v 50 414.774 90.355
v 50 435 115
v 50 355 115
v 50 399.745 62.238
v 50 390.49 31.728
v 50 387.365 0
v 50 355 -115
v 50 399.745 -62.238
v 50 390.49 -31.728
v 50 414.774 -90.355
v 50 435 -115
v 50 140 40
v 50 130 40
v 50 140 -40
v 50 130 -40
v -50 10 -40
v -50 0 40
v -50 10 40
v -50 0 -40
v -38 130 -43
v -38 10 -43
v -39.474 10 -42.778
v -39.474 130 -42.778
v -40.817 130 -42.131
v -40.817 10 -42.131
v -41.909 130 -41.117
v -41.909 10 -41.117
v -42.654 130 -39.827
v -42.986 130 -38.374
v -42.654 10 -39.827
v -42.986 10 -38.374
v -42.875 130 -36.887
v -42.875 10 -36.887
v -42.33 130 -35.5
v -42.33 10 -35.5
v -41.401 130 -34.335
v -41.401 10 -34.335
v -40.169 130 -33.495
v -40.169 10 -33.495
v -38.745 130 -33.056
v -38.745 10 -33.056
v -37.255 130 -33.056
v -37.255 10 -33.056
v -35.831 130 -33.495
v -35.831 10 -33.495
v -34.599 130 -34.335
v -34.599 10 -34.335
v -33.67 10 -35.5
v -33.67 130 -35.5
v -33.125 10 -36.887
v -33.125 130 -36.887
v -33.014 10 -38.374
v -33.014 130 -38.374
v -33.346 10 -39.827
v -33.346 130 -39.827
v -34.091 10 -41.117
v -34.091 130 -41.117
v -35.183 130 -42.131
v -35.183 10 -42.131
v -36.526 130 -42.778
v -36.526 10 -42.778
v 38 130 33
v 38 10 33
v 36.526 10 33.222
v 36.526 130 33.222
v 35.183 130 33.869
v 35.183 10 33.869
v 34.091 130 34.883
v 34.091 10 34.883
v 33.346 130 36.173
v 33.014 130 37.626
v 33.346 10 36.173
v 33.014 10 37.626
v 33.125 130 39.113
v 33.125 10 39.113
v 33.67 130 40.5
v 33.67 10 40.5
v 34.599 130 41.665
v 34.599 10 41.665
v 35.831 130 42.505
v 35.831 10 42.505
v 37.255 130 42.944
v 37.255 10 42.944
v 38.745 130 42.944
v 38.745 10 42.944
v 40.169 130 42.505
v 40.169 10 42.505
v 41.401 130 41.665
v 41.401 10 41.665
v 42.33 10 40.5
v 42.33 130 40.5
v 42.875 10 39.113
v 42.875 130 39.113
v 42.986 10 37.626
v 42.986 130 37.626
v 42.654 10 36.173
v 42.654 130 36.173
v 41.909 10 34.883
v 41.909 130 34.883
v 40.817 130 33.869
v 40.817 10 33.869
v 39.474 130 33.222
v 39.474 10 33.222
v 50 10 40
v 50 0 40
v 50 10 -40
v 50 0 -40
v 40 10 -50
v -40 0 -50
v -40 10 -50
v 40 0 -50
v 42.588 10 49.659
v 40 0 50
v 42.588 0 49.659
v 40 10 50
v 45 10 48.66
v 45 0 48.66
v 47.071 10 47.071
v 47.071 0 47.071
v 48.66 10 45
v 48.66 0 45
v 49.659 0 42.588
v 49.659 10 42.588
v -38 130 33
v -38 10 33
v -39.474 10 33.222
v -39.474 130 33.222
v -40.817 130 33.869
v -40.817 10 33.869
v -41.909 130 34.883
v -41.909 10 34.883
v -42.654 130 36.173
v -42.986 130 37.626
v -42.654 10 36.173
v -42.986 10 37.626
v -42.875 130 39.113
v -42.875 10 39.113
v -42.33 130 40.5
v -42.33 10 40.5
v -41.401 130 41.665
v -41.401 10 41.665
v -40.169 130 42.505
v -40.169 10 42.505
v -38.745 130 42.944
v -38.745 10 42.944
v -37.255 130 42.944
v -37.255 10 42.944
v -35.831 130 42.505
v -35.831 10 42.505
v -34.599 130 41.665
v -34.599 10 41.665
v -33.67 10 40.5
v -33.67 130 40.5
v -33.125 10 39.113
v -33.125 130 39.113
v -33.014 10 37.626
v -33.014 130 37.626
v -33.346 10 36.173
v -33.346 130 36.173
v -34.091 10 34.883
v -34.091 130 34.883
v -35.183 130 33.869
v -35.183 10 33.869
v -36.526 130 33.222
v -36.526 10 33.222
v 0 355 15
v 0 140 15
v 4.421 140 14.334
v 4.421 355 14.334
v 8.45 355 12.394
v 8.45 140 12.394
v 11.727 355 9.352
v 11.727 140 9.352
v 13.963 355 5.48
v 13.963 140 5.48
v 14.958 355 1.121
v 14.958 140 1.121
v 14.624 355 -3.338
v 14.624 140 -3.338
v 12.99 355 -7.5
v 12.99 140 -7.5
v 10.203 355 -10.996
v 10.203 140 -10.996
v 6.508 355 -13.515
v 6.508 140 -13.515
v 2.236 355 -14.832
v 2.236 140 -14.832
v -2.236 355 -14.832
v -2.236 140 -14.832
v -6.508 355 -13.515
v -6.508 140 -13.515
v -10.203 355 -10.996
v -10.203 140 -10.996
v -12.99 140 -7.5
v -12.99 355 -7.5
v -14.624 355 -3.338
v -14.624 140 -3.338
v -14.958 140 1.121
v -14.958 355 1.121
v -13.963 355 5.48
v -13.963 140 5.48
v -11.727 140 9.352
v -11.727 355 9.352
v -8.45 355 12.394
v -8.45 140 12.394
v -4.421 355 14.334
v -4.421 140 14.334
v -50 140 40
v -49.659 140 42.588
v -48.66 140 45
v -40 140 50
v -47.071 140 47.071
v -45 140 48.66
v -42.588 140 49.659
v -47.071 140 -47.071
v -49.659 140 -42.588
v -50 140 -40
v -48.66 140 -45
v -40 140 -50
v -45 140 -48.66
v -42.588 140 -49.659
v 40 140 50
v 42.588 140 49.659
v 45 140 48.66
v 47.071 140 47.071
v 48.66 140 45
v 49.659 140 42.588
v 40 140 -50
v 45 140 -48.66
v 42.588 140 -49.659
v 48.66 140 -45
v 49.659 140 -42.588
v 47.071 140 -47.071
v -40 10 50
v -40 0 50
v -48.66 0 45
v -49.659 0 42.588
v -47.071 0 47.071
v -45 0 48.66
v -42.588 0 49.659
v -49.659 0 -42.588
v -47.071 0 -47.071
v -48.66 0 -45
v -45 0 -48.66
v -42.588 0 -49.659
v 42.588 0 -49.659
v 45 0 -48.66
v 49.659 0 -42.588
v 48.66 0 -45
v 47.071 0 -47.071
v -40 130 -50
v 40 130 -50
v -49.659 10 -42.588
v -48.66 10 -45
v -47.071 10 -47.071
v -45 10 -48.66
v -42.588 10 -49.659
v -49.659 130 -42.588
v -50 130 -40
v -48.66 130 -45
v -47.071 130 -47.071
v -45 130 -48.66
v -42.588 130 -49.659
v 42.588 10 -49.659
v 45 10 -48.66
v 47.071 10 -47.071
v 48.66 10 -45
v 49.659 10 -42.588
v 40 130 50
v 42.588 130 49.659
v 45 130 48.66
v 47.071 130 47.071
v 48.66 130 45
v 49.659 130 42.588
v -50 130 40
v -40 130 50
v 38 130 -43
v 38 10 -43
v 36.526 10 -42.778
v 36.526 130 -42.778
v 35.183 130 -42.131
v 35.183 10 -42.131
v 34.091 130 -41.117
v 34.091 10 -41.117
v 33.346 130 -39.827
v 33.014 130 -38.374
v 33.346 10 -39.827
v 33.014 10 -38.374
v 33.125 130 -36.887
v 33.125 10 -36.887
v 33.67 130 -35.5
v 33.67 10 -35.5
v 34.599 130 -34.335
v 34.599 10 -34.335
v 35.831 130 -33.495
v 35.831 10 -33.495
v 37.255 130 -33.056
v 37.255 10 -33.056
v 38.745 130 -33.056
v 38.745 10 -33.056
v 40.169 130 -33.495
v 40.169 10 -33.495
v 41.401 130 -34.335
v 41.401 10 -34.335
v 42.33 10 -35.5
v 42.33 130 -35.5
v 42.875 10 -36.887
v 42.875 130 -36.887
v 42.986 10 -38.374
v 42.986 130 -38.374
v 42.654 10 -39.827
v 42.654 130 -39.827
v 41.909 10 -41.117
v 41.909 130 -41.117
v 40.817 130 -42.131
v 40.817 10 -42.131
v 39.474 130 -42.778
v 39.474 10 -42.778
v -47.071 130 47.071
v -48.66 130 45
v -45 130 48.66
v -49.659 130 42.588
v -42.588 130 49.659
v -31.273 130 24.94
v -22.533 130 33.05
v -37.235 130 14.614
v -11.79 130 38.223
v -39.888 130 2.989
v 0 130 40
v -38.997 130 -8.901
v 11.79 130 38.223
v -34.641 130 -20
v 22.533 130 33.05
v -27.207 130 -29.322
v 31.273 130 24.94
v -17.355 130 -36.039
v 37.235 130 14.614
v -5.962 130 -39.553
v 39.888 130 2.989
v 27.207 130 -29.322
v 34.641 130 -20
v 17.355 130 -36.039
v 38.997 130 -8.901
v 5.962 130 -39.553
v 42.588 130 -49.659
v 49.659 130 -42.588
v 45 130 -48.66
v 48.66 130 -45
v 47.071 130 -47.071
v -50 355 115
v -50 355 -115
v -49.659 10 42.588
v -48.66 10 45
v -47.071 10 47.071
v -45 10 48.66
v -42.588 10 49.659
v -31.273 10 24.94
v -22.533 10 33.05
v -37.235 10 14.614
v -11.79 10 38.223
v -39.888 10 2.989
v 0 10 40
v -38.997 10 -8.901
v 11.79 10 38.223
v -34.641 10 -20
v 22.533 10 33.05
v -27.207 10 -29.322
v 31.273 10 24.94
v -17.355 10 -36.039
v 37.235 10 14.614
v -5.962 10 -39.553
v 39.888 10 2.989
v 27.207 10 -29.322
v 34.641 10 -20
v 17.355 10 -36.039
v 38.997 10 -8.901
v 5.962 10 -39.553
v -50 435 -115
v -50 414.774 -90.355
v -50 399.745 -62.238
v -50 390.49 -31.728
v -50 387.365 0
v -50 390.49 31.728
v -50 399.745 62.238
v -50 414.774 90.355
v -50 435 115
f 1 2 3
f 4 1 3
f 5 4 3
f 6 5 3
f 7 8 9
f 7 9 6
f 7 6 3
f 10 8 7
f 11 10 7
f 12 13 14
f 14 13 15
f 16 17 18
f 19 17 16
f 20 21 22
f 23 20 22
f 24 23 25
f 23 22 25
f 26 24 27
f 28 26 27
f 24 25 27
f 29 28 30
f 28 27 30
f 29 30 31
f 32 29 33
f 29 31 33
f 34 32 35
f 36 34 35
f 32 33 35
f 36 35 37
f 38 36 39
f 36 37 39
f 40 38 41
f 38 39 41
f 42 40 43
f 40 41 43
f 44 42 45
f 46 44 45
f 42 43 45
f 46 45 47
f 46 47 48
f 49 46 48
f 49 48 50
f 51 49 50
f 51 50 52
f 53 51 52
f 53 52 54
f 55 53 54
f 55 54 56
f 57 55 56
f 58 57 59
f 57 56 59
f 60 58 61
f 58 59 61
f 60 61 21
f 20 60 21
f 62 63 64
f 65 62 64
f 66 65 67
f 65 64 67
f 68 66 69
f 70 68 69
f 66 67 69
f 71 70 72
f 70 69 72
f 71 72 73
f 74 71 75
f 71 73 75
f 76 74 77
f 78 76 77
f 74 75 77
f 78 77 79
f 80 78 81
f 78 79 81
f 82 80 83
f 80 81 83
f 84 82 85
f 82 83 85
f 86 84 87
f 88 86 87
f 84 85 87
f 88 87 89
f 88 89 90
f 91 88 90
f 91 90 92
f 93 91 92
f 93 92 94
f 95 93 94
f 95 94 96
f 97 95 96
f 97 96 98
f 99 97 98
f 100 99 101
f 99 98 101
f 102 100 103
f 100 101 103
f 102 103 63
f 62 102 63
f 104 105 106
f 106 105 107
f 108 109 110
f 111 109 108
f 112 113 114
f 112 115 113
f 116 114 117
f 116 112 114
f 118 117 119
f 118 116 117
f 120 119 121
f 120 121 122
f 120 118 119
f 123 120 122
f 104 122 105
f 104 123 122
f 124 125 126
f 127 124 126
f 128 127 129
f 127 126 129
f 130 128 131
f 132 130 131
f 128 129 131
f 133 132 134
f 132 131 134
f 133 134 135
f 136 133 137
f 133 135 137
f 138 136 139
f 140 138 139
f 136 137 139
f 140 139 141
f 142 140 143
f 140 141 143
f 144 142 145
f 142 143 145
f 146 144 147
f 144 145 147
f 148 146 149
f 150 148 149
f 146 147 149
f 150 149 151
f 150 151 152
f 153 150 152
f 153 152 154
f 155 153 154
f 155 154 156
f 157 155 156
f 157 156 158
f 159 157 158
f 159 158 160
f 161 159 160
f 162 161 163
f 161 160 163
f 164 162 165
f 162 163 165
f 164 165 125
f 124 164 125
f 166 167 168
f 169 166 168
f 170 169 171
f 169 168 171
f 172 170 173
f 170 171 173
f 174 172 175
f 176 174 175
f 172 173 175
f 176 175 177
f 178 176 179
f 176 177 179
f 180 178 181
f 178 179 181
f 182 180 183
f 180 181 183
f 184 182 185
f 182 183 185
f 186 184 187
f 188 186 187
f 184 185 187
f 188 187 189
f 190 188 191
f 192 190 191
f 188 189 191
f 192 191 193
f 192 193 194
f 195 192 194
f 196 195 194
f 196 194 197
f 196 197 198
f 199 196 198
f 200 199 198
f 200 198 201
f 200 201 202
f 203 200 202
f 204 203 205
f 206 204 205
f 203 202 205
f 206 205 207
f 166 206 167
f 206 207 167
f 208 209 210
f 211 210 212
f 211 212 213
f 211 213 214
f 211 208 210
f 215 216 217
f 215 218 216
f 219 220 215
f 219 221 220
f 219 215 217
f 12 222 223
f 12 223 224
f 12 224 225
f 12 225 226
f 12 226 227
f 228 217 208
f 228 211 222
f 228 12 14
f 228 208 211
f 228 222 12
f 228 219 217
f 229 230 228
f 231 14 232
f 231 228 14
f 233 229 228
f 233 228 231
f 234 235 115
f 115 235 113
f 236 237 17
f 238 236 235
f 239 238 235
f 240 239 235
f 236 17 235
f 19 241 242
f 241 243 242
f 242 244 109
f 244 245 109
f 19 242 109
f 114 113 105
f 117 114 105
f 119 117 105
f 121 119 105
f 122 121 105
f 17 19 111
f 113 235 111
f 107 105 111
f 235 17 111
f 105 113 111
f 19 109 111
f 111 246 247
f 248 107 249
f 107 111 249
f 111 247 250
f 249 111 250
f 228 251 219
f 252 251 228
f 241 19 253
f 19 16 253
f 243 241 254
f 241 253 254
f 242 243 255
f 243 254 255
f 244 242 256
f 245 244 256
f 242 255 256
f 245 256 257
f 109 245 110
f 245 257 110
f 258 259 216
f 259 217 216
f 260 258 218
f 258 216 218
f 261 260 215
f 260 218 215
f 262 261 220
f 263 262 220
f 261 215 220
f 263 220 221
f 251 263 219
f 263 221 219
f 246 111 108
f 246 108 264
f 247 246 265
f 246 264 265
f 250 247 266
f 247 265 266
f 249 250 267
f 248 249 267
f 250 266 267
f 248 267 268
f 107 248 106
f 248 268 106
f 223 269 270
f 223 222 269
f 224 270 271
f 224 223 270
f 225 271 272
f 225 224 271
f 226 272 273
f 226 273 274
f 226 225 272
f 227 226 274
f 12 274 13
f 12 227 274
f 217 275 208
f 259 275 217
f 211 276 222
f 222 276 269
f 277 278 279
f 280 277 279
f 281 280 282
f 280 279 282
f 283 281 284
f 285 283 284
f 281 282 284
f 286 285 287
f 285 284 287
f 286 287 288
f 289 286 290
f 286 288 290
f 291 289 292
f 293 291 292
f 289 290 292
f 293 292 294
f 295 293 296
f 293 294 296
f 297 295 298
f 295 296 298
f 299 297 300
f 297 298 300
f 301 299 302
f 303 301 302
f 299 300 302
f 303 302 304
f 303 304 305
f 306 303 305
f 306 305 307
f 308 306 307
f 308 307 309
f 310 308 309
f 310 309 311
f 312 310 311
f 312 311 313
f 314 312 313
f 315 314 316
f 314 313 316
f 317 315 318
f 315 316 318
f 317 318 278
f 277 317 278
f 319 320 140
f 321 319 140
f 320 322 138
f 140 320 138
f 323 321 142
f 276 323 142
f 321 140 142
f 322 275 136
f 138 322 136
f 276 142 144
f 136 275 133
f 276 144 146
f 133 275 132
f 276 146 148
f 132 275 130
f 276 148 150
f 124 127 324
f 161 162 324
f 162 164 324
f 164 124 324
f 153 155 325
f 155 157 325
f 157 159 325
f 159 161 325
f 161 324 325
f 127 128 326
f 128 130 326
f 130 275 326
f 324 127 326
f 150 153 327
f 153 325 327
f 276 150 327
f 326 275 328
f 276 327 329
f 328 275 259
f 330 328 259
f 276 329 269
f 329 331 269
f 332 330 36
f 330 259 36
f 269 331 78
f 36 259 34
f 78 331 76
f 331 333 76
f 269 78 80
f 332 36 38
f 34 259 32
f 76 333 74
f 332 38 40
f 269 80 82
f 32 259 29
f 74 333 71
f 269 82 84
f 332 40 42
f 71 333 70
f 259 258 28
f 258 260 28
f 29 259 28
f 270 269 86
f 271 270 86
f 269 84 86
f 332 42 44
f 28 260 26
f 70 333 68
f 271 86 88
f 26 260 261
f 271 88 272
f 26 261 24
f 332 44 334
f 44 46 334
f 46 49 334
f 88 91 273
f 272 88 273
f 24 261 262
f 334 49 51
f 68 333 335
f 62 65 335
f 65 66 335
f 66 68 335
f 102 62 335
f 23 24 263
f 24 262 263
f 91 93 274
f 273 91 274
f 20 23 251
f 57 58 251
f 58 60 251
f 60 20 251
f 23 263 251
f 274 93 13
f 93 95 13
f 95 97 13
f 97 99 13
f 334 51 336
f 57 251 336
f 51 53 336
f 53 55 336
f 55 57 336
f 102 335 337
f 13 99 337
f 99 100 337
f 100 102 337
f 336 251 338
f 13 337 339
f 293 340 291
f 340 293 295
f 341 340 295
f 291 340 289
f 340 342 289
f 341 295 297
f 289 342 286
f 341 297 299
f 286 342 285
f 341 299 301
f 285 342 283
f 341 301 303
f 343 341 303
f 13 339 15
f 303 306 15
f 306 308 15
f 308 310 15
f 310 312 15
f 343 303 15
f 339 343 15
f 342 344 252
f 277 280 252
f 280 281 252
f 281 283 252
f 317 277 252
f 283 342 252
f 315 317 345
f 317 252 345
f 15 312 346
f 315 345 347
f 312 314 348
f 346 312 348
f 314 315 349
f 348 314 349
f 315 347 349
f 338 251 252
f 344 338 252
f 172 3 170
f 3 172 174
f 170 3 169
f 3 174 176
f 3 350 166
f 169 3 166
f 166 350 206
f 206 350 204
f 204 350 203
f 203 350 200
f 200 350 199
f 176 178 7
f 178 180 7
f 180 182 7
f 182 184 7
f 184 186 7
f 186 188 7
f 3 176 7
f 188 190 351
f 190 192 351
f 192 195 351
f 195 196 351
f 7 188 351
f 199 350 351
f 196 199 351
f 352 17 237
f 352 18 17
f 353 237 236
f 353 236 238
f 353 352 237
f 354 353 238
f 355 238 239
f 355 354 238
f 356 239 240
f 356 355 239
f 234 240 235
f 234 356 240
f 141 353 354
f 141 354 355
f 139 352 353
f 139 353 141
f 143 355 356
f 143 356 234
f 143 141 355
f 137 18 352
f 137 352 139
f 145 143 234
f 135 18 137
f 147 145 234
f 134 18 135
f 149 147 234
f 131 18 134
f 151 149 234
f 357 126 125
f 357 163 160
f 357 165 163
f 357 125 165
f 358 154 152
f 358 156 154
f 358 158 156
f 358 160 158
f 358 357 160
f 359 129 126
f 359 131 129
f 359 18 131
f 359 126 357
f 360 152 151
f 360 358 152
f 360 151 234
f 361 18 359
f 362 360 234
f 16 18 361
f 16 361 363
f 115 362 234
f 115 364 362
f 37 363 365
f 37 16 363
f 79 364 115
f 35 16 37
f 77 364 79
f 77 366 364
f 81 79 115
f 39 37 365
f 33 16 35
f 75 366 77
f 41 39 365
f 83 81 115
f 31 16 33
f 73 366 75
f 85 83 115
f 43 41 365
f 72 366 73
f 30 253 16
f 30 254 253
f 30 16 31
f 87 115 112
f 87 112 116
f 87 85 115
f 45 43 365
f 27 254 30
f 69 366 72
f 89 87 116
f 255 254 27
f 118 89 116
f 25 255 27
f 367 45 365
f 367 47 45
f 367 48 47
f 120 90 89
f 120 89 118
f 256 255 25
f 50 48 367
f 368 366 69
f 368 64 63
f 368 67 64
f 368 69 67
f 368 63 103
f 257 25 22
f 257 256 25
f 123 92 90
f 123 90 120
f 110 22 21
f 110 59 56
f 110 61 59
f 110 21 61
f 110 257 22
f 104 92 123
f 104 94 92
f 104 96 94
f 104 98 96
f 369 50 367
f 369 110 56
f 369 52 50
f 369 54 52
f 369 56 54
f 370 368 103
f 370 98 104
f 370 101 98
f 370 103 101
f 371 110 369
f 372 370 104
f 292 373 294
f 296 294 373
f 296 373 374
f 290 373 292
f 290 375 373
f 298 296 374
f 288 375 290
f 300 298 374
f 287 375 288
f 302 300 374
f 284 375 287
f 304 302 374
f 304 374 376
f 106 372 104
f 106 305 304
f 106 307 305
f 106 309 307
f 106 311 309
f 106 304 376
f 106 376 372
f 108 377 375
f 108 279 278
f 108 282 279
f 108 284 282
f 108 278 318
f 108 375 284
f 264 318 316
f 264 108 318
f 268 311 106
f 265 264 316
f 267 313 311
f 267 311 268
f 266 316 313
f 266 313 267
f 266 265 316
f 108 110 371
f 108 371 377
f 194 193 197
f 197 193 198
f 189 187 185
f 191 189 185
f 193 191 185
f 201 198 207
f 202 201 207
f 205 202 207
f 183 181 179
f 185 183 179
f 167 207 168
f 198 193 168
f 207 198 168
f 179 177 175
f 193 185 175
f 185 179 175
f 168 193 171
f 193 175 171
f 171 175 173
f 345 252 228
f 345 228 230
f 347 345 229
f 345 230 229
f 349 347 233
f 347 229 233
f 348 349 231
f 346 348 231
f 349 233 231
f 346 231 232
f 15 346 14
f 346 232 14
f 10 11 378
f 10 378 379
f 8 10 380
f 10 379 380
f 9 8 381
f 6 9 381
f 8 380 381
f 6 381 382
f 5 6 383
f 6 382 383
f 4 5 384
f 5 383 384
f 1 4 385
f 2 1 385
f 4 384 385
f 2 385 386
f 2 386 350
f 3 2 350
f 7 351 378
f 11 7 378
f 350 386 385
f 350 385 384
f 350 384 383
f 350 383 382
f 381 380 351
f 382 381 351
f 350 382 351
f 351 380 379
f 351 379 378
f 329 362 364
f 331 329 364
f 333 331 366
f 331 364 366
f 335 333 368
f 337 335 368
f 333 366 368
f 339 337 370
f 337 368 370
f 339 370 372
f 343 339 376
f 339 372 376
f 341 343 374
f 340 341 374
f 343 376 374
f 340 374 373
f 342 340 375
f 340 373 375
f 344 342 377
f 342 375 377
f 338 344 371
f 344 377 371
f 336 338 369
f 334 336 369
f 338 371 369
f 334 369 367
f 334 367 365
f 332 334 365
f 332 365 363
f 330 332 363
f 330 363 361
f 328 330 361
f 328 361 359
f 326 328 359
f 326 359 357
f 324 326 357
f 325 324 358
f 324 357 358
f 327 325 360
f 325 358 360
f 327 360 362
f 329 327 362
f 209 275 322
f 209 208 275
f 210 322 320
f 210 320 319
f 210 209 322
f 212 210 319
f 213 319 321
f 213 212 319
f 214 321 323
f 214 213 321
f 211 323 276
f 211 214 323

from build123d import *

# Parameters (mm, degrees)
SKETCH1_W                = 100
SKETCH1_H                = 100
BOSS_EXTRUDE1_DEPTH      = 10
SKETCH2_R                = 40
BOSS_EXTRUDE2_DEPTH      = 120
SKETCH3_W                = 100
SKETCH3_H                = 100
BOSS_EXTRUDE3_DEPTH      = 10
SKETCH4_R                = 15
BOSS_EXTRUDE4_DEPTH      = 215
SKETCH5_R                = 5
BOSS_EXTRUDE5_DEPTH      = 120
FILLET1_R                = 10
BOSS_EXTRUDE6_DEPTH      = 50
BOSS_EXTRUDE6_DEPTH_BACK = 50


with BuildPart() as part:
    # Sketch1 → Boss-Extrude1 (new body)
    with BuildSketch(Plane(origin=(0, 0, 0), x_dir=(1, 0, 0), z_dir=(0, 1, 0))):
        Rectangle(SKETCH1_W, SKETCH1_H)
    extrude(amount=BOSS_EXTRUDE1_DEPTH)



with BuildPart() as body_2:
    # Sketch2 → Boss-Extrude2 (new body)
    with BuildSketch(Plane(origin=(0, 10, 0), x_dir=(1, 0, 0), z_dir=(0, 1, 0))):
        with Locations(Location((0, 0, 0), (0, 0, 270))):
            Circle(SKETCH2_R)
    extrude(amount=BOSS_EXTRUDE2_DEPTH)


with BuildPart() as body_3:
    # Sketch3 → Boss-Extrude3 (new body)
    with BuildSketch(Plane(origin=(0, 130, 0), x_dir=(1, 0, 0), z_dir=(0, 1, 0))):
        Rectangle(SKETCH3_W, SKETCH3_H)
    extrude(amount=BOSS_EXTRUDE3_DEPTH)


with BuildPart() as body_4:
    # Sketch4 → Boss-Extrude4 (new body)
    with BuildSketch(Plane(origin=(0, 140, 0), x_dir=(1, 0, 0), z_dir=(0, 1, 0))):
        with Locations(Location((0, 0, 0), (0, 0, 270))):
            Circle(SKETCH4_R)
    extrude(amount=BOSS_EXTRUDE4_DEPTH)

    # Sketch6 → Boss-Extrude6 (add, two sides: drawn at the far end of the back side and taken through both)
    with BuildSketch(Plane(origin=(0, 0, 0), x_dir=(0, 0, -1), z_dir=(1, 0, 0)).offset(-BOSS_EXTRUDE6_DEPTH_BACK)):
        with BuildLine():
            Line((-115, 435), (-115, 355))
            Line((-115, 355), (115, 355))
            Line((115, 355), (115, 435))
            ThreePointArc((115, 435), (0, 387.365440327), (-115, 435))
        make_face()
    extrude(amount=BOSS_EXTRUDE6_DEPTH + BOSS_EXTRUDE6_DEPTH_BACK)


with BuildPart() as part_1:
    add(part.part)

    add(body_2.part)  # Boss-Extrude5 merges body 2

    add(body_3.part)  # Boss-Extrude5 merges body 3
    # Sketch5 → Boss-Extrude5 (add)
    with BuildSketch(Plane(origin=(0, 10, 0), x_dir=(1, 0, 0), z_dir=(0, 1, 0))):
        with Locations(Location((-38, 38, 0), (0, 0, 90))):
            Circle(SKETCH5_R)
        with Locations(Location((38, 38, 0), (0, 0, 90))):
            Circle(SKETCH5_R)
        with Locations(Location((38, -38, 0), (0, 0, 90))):
            Circle(SKETCH5_R)
        with Locations(Location((-38, -38, 0), (0, 0, 90))):
            Circle(SKETCH5_R)
    extrude(amount=BOSS_EXTRUDE5_DEPTH)

    # Fillet1
    fillet1_edges = [part_1.edges().sort_by_distance(p)[0] for p in [
        (-50, 135, -50),
        (-50, 135, 50),
        (50, 135, 50),
        (50, 135, -50),
        (50, 5, 50),
        (-50, 5, 50),
        (-50, 5, -50),
        (50, 5, -50),
    ]]
    fillet(fillet1_edges, radius=FILLET1_R)


solid = Compound([body_4.part, part_1.part])
